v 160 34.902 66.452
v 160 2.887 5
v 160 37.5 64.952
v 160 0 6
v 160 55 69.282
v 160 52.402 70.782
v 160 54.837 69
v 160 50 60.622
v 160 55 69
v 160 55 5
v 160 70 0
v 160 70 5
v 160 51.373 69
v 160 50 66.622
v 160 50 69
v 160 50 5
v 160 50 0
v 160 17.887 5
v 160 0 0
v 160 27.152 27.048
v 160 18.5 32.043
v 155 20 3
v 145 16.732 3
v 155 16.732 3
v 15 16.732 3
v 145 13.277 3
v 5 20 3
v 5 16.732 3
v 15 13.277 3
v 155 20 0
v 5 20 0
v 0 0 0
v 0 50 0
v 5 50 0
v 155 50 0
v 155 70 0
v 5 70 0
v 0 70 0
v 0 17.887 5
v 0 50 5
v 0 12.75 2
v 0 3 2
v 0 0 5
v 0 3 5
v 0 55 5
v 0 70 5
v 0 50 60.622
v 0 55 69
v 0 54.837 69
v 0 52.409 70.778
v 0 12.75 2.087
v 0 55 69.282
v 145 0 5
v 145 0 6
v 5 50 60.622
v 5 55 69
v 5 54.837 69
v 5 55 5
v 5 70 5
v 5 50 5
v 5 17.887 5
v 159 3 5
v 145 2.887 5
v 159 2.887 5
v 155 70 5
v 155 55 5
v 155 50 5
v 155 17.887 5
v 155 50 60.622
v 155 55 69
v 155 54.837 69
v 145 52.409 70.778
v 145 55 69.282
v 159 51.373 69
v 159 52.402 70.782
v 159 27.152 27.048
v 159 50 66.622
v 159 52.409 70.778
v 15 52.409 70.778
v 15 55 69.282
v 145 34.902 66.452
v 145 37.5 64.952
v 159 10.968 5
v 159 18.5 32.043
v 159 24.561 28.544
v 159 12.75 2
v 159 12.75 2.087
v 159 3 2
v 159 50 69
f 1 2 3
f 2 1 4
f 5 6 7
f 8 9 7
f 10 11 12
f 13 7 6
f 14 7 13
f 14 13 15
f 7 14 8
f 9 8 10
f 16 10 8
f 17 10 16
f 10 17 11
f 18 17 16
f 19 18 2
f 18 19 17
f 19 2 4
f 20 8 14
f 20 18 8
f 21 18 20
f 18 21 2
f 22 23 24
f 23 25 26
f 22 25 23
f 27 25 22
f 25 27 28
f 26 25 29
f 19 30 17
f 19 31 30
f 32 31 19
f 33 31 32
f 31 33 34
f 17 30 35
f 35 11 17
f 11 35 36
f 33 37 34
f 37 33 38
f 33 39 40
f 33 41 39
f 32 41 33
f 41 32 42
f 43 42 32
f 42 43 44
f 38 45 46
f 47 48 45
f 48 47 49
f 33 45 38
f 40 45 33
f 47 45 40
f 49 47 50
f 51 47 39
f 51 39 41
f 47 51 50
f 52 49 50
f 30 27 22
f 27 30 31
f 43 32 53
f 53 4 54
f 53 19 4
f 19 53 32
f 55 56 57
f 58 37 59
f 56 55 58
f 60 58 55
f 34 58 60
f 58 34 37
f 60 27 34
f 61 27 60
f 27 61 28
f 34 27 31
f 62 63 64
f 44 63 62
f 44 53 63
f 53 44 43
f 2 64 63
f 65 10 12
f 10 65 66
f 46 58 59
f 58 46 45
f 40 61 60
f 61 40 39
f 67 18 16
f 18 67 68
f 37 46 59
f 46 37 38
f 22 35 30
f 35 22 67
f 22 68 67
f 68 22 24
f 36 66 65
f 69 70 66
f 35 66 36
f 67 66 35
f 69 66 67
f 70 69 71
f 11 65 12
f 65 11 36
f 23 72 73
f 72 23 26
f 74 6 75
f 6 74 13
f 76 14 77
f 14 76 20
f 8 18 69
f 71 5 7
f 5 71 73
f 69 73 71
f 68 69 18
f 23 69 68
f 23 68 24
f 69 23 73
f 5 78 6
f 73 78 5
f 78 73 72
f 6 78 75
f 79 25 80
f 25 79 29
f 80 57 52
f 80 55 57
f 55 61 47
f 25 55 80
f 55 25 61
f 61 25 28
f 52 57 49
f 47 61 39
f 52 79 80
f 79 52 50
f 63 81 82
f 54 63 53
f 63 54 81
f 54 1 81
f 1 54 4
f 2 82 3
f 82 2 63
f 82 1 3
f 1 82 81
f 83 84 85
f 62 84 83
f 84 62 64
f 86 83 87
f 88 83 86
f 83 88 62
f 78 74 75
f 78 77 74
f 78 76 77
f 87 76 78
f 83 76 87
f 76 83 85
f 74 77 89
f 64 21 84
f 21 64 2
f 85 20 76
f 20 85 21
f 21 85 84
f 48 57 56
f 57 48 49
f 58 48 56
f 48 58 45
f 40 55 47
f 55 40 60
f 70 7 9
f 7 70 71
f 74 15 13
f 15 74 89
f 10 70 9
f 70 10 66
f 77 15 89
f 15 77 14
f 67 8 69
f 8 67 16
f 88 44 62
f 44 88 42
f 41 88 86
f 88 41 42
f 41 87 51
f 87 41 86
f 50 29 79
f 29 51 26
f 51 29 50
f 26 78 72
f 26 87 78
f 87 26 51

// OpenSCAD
difference()
{
union()
{
cube([160,20,3]);
cube([5, 70, 5]);
translate([155,0,0]) cube([5, 70, 5]);
translate([145,15,0]) rotate([60,0,0]) cube([15, 80, 3]);
translate([0,15,0]) rotate([60,0,0]) cube([15, 80, 3]);
translate([145,0,0]) rotate([60,0,0]) cube([15, 75, 3]);
rotate([60,0,0]) translate([159,2,-10]) cube([1, 35, 10]);
translate([0, 50,0]) cube([5,5,69]);
translate([155, 50,0]) cube([5,5,69]);
cube([160,3, 5]);
}
translate([0, 3, 2]) cube([159,9.75, 3]);
translate([0,12.7,2]) rotate([60,0,0]) cube([159, 80, 3]);
translate([0,-5,0]) cube([160,5,6]);
translate([0,0,-10]) cube([160,50,10]);
}
